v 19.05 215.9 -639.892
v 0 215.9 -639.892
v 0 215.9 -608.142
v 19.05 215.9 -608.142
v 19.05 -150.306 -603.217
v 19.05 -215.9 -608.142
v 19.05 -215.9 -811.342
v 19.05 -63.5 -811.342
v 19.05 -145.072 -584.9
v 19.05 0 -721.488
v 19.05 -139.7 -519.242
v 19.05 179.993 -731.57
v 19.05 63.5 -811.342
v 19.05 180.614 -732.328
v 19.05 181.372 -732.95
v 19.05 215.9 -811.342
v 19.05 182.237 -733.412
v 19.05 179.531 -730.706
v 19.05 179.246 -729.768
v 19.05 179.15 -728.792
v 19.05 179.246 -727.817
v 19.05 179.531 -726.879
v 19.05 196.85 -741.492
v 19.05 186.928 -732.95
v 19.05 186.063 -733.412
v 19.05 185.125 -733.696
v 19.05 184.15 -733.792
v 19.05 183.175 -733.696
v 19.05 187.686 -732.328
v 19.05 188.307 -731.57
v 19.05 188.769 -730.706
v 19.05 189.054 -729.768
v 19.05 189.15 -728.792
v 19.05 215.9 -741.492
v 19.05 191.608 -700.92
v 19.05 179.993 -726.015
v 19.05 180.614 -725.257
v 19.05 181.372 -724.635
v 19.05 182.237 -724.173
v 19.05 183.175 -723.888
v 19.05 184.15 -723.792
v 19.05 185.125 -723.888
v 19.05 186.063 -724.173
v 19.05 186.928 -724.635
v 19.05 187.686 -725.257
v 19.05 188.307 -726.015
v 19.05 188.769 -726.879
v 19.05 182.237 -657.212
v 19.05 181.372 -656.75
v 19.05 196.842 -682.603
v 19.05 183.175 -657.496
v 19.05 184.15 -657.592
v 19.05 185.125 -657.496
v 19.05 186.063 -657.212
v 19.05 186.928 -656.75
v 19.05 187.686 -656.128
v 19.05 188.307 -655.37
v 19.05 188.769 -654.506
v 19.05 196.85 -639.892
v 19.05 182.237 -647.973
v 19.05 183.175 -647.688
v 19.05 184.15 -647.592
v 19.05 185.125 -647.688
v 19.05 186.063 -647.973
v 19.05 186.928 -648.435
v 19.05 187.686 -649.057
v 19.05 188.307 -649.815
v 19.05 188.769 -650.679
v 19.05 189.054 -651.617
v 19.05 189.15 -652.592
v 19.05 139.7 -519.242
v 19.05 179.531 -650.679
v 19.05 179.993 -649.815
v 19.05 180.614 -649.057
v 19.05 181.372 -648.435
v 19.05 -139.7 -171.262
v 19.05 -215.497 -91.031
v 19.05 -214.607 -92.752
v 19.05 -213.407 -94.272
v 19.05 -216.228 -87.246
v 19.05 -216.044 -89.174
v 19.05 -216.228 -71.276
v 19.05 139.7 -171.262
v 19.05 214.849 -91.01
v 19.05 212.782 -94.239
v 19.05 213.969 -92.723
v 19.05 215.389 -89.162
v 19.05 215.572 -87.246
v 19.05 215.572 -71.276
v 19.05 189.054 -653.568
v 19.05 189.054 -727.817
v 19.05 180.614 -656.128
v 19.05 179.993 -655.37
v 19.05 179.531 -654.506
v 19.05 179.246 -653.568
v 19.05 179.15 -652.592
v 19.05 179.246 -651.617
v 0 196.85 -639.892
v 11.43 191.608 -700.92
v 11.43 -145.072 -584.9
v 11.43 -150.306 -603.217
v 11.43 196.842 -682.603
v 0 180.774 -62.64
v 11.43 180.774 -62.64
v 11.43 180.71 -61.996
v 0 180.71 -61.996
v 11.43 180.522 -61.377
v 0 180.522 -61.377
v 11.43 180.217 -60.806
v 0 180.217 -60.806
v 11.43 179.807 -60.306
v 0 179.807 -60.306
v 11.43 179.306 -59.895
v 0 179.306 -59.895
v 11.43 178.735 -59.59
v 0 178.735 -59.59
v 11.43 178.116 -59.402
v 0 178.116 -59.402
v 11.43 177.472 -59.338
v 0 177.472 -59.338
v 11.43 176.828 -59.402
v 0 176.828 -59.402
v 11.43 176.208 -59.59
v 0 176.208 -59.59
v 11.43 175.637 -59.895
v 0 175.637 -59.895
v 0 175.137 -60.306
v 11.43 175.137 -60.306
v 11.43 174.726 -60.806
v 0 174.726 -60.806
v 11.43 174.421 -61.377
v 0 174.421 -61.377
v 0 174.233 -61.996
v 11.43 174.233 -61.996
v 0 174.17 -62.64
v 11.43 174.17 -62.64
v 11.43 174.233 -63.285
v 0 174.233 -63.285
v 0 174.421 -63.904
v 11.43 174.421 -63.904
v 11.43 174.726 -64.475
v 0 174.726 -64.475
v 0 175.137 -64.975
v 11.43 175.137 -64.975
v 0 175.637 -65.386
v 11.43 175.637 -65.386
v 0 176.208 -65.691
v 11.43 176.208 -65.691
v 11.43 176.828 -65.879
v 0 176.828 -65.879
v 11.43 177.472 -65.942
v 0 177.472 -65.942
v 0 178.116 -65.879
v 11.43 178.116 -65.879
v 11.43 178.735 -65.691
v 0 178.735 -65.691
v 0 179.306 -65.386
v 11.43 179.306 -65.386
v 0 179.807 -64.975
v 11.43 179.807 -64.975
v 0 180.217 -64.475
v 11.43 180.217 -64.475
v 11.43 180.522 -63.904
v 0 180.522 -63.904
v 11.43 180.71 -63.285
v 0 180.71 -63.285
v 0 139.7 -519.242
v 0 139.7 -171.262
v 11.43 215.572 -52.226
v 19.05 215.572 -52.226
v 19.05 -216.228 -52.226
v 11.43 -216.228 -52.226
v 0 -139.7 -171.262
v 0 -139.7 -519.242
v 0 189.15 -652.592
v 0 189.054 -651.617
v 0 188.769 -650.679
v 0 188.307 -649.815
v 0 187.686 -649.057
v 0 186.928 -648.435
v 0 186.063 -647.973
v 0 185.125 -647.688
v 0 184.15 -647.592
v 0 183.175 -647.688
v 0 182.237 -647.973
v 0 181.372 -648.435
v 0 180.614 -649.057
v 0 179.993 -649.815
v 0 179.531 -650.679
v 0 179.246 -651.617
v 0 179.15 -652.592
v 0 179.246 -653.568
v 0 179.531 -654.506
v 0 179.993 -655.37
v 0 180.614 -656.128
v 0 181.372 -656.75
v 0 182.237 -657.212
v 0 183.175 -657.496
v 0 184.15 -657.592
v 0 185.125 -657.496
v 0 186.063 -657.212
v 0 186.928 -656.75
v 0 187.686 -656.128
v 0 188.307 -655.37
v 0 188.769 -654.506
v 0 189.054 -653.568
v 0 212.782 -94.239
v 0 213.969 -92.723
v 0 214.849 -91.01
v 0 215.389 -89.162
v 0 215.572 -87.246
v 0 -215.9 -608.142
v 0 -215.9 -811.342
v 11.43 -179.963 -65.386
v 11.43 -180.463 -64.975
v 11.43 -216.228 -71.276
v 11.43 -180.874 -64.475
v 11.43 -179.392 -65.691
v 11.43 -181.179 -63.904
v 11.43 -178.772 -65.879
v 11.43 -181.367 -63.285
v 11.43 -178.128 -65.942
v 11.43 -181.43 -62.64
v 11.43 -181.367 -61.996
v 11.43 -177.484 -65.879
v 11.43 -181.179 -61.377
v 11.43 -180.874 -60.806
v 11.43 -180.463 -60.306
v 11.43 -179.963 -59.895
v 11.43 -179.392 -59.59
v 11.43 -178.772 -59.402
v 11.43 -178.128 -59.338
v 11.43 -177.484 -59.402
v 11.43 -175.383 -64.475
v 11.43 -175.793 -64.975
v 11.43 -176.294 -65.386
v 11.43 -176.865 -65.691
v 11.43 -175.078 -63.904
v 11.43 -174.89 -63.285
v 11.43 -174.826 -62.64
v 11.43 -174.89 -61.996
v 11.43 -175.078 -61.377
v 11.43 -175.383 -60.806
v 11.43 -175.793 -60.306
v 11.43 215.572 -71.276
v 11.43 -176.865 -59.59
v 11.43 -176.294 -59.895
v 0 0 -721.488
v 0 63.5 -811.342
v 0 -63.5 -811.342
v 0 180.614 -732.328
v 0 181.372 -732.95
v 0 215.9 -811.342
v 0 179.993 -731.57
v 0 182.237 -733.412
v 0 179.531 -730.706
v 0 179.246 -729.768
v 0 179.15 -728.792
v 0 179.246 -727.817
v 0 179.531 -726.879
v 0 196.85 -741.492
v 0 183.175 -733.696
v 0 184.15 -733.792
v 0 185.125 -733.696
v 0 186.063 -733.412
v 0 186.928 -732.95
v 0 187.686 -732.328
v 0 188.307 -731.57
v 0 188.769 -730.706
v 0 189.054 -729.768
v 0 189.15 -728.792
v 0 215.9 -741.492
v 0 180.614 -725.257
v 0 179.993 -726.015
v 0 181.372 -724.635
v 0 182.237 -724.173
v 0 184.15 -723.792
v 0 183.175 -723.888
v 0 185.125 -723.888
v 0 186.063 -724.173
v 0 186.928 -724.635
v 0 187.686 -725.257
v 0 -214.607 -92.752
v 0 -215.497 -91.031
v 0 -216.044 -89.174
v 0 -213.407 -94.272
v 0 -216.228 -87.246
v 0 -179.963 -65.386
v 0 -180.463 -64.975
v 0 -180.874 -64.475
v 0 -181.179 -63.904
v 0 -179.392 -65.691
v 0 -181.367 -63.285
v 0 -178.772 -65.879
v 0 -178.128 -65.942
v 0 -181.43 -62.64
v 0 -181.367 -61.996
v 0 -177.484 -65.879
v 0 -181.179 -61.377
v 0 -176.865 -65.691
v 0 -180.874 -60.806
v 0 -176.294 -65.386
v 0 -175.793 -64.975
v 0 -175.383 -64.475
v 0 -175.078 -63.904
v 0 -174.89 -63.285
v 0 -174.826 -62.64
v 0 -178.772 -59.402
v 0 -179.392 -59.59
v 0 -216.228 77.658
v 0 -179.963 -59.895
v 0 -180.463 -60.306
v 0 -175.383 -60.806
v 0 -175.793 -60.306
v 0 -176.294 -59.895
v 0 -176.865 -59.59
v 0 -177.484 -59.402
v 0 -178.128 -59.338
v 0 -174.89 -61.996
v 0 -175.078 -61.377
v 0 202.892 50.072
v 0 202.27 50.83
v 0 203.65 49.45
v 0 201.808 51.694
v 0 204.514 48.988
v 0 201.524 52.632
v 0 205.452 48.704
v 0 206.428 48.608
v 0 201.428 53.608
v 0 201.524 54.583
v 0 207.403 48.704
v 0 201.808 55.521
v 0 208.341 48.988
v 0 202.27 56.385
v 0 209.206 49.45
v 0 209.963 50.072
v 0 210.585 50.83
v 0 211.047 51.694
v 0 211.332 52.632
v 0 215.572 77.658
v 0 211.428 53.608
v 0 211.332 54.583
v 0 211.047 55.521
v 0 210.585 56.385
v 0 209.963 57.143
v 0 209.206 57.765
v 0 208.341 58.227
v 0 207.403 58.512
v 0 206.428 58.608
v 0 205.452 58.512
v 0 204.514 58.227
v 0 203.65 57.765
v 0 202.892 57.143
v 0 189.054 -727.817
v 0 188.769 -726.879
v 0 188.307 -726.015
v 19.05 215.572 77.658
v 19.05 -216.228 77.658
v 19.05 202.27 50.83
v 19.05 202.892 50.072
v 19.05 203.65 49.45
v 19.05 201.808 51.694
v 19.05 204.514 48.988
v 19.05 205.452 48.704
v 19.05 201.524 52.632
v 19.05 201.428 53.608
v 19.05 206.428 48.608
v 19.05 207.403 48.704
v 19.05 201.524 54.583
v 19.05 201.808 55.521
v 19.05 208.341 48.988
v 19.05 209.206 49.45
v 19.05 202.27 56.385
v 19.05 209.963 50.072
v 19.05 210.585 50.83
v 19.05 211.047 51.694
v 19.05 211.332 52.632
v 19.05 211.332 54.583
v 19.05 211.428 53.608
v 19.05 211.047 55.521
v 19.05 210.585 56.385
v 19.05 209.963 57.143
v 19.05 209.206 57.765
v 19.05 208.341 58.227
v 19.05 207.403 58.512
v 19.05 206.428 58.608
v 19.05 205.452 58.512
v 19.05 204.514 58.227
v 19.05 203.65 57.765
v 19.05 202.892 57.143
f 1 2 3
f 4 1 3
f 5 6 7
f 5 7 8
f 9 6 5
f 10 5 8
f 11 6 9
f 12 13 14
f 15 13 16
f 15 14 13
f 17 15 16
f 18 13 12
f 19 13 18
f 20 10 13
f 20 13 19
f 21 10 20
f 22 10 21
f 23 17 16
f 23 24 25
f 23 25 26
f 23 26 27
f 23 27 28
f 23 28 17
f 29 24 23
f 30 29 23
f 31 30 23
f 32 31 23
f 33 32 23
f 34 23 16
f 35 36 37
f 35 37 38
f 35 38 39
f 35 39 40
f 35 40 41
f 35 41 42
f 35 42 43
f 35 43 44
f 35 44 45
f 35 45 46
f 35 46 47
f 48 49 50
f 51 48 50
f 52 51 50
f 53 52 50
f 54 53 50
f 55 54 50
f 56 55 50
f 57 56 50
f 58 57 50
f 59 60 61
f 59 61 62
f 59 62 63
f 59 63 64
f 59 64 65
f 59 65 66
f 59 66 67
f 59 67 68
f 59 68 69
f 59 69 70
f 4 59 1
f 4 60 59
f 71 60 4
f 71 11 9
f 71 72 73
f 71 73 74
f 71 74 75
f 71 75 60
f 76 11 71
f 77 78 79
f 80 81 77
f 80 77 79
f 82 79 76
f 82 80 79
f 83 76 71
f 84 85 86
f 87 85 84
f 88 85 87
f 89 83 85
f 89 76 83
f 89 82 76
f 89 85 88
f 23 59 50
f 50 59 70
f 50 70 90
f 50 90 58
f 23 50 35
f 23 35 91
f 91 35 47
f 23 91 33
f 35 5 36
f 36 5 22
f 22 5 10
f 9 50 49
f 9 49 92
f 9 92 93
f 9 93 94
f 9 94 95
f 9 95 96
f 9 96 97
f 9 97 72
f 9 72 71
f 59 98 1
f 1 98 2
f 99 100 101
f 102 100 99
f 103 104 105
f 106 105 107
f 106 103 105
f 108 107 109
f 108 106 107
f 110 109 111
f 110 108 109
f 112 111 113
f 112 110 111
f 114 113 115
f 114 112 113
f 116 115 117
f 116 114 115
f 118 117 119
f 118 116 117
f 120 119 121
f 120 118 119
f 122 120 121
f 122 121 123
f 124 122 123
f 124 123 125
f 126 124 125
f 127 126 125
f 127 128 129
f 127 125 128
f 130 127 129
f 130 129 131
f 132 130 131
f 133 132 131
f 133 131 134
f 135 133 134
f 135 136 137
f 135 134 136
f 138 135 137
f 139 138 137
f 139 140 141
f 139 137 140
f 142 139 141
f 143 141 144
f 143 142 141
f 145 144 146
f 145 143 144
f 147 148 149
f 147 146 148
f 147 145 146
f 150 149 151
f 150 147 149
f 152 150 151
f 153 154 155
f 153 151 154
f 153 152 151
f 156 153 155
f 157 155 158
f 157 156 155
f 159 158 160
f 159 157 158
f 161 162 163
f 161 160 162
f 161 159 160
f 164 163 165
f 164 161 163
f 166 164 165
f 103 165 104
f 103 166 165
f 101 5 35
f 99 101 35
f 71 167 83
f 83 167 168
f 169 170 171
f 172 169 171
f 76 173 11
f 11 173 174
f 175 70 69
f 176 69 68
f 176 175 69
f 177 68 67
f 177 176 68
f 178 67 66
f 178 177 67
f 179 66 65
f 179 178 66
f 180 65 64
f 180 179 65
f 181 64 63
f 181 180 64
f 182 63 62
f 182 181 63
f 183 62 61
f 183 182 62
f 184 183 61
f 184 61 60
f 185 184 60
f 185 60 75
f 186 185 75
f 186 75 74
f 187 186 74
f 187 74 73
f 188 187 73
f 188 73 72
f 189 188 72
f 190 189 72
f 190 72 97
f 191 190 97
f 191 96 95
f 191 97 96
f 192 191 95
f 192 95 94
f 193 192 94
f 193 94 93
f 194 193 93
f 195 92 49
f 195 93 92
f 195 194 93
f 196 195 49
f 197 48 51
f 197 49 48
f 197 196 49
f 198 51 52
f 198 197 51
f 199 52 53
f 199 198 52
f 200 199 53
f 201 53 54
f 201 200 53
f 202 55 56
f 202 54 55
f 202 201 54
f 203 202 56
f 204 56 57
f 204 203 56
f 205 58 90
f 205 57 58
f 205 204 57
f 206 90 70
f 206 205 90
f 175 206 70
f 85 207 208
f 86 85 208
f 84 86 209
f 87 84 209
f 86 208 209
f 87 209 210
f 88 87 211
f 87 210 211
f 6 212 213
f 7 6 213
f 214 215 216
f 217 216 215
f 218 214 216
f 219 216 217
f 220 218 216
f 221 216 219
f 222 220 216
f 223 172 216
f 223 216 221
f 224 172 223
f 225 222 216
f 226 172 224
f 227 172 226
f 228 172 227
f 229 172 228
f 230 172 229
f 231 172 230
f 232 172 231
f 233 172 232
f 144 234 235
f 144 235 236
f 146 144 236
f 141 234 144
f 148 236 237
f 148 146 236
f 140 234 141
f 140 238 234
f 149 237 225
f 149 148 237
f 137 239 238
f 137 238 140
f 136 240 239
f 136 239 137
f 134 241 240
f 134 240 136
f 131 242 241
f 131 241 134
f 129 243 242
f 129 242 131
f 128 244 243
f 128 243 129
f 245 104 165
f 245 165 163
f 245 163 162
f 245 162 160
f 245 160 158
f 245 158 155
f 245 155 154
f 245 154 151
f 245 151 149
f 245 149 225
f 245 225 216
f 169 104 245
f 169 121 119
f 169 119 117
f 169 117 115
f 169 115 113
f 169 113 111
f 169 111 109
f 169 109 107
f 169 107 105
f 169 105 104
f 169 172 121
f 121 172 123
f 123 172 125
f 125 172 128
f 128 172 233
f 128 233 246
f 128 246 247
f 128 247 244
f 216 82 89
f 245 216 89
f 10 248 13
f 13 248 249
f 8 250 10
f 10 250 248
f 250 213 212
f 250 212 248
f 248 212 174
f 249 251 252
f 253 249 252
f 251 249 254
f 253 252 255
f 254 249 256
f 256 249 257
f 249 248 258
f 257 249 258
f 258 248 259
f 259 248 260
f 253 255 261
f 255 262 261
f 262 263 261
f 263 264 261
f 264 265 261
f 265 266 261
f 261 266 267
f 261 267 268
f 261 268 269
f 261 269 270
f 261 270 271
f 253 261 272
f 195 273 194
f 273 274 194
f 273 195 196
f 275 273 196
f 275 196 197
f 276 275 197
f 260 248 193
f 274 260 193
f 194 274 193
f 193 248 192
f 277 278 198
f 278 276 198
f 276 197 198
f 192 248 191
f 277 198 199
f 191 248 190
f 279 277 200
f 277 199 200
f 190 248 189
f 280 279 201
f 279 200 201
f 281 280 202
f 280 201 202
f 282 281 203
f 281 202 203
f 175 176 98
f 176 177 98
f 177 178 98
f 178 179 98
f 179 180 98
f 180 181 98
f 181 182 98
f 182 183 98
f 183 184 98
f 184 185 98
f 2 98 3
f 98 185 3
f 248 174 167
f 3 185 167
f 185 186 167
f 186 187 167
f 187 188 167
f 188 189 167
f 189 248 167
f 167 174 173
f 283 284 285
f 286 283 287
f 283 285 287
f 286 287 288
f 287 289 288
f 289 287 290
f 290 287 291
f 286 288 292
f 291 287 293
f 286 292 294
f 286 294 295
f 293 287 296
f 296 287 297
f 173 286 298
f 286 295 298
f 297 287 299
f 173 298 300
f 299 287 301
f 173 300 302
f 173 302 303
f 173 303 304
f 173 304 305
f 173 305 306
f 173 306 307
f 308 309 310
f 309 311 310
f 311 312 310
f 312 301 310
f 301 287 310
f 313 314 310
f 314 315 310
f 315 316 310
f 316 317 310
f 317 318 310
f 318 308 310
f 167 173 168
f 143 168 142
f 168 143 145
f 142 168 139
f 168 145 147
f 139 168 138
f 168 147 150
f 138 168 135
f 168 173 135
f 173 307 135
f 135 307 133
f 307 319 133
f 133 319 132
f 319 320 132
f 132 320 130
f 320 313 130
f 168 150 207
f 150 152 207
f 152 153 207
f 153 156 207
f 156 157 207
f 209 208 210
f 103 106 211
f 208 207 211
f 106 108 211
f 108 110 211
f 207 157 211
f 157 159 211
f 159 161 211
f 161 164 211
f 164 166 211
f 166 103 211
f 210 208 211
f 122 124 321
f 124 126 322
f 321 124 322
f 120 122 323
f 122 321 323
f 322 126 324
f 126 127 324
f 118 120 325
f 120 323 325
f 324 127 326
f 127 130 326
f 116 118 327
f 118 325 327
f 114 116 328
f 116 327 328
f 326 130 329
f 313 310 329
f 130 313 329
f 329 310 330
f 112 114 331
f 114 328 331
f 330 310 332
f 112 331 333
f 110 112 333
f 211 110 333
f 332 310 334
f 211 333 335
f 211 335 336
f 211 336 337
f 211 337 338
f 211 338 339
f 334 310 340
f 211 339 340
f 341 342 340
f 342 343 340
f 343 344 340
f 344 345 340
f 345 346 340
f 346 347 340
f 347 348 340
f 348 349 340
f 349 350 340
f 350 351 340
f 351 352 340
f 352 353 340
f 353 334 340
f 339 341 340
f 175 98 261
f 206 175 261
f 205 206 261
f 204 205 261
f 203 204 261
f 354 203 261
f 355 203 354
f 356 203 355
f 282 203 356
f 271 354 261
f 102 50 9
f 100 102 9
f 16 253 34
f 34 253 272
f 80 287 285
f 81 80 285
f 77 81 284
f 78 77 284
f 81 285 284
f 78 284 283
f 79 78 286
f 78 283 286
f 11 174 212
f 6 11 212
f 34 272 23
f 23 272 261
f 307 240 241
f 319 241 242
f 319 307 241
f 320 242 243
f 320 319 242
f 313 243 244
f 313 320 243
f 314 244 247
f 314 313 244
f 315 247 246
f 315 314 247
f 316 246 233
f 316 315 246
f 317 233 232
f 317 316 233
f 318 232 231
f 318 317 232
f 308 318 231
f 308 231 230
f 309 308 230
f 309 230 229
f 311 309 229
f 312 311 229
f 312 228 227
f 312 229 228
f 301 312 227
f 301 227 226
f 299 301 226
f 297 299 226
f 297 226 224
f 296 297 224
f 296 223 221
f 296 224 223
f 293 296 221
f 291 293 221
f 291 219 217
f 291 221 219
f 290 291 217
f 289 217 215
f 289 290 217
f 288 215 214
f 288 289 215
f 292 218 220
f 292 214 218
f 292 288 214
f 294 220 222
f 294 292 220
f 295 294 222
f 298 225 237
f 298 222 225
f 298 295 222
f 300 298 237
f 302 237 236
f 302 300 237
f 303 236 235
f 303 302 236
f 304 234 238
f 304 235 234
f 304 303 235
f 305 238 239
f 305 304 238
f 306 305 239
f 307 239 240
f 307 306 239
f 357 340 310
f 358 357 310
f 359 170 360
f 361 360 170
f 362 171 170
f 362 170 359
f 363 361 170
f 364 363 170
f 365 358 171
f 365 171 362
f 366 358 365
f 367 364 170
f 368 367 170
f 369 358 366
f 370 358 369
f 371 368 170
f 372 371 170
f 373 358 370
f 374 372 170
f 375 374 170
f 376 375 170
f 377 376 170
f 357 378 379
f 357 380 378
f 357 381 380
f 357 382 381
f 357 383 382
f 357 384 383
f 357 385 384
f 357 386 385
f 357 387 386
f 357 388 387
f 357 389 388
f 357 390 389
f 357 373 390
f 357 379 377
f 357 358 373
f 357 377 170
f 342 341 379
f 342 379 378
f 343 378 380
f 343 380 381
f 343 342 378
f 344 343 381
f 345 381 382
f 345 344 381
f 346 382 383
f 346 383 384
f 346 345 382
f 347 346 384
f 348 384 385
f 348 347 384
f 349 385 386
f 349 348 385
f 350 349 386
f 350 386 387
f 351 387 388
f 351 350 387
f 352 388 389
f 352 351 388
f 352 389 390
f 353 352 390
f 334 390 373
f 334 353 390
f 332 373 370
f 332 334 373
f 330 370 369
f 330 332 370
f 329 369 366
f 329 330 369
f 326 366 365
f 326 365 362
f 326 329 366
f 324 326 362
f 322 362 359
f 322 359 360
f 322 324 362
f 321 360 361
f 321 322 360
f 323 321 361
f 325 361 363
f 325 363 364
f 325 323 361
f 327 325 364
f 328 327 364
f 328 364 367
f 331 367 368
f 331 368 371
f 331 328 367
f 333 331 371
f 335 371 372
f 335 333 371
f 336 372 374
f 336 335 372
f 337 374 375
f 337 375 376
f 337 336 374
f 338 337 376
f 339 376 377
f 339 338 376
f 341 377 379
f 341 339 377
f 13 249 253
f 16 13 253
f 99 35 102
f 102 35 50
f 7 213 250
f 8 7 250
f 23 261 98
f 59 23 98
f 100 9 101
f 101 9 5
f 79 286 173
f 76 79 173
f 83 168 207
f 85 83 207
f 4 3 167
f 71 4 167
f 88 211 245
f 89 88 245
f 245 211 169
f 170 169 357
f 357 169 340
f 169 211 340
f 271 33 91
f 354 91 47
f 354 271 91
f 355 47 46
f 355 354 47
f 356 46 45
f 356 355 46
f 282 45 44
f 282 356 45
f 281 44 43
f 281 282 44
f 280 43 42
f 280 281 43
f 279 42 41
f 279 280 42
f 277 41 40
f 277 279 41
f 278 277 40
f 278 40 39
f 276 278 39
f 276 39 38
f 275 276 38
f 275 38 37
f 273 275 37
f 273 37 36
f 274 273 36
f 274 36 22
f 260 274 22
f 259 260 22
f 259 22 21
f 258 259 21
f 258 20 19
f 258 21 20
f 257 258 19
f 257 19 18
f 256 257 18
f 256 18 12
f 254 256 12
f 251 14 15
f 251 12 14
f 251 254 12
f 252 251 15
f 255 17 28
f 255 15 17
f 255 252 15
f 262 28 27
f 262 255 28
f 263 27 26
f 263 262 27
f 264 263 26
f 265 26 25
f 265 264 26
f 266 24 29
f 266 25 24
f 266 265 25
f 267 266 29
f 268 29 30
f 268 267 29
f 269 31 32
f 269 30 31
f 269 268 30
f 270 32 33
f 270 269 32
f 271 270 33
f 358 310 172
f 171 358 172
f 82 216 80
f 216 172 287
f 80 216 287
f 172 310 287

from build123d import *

# Parameters (mm, degrees)
F1_DEPTH = 19.05
F3_DEPTH = 7.62
F5_DEPTH = 7.62
F6_R     = 3.302
F6_R_2   = 5
F7_DEPTH = 19.05
F8_R     = 5
F9_DEPTH = 25.4


with BuildPart() as f1:
    # F0 (on Right) → F1 (new body)
    with BuildSketch(Plane.YZ):
        with BuildLine():
            Line((215.571838, -87.245801), (215.571838, 77.657629))
            Line((215.571838, 77.657629), (-216.228162, 77.657629))
            Line((-216.228162, 77.657629), (-216.228162, -87.245801))
            ThreePointArc((-216.228162, -87.245801), (-215.49657, -91.031394), (-213.407155, -94.271809))
            Line((-213.407155, -94.271809), (-139.7, -171.262371))
            Line((-139.7, -171.262371), (-139.7, -519.242371))
            Line((-139.7, -519.242371), (-215.9, -608.142371))
            Line((-215.9, -608.142371), (-215.9, -811.342371))
            Line((-215.9, -811.342371), (-63.5, -811.342371))
            Line((-63.5, -811.342371), (0, -721.487939))
            Line((0, -721.487939), (63.5, -811.342371))
            Line((63.5, -811.342371), (215.9, -811.342371))
            Line((215.9, -811.342371), (215.9, -741.492371))
            Line((215.9, -741.492371), (196.85, -741.492371))
            Line((196.85, -741.492371), (196.85, -639.892371))
            Line((196.85, -639.892371), (215.9, -639.892371))
            Line((215.9, -639.892371), (215.9, -608.142371))
            Line((215.9, -608.142371), (139.7, -519.242371))
            Line((139.7, -519.242371), (139.7, -171.262371))
            Line((139.7, -171.262371), (212.782136, -94.238963))
            ThreePointArc((212.782136, -94.238963), (214.848676, -91.010331), (215.571838, -87.245801))
        make_face()
    extrude(amount=F1_DEPTH)

    # F2 (on face) → F3 (cut)
    with BuildSketch(Plane.YZ.offset(19.05)):
        Polygon((191.608355, -700.919833), (196.842454, -682.602991), (-145.071934, -584.899811), (-150.306033, -603.216653), align=None)
    extrude(amount=-F3_DEPTH, mode=Mode.SUBTRACT)

    # F4 (on face) → F5 (cut)
    with BuildSketch(Plane.YZ.offset(19.05)):
        Polygon((-216.228162, -71.276438), (216.173725, -71.276438), (215.571838, -52.226438), (-216.228162, -52.226438), align=None)
    extrude(amount=-F5_DEPTH, mode=Mode.SUBTRACT)

    # F6 (on face) → F7 (cut)
    with BuildSketch(Plane.YZ):
        with Locations((-178.128162, -62.640438)):
            Circle(F6_R)
        with Locations((177.471838, -62.640438)):
            Circle(F6_R)
        with Locations((206.427838, 53.607629)):
            Circle(F6_R_2)
    extrude(amount=F7_DEPTH, mode=Mode.SUBTRACT)

    # F8 (on face) → F9 (cut)
    with BuildSketch(Plane.YZ):
        with Locations((184.15, -728.792371)):
            Circle(F8_R)
        with Locations((184.15, -652.592371)):
            Circle(F8_R)
    extrude(amount=F9_DEPTH, mode=Mode.SUBTRACT)


solid = f1.part
